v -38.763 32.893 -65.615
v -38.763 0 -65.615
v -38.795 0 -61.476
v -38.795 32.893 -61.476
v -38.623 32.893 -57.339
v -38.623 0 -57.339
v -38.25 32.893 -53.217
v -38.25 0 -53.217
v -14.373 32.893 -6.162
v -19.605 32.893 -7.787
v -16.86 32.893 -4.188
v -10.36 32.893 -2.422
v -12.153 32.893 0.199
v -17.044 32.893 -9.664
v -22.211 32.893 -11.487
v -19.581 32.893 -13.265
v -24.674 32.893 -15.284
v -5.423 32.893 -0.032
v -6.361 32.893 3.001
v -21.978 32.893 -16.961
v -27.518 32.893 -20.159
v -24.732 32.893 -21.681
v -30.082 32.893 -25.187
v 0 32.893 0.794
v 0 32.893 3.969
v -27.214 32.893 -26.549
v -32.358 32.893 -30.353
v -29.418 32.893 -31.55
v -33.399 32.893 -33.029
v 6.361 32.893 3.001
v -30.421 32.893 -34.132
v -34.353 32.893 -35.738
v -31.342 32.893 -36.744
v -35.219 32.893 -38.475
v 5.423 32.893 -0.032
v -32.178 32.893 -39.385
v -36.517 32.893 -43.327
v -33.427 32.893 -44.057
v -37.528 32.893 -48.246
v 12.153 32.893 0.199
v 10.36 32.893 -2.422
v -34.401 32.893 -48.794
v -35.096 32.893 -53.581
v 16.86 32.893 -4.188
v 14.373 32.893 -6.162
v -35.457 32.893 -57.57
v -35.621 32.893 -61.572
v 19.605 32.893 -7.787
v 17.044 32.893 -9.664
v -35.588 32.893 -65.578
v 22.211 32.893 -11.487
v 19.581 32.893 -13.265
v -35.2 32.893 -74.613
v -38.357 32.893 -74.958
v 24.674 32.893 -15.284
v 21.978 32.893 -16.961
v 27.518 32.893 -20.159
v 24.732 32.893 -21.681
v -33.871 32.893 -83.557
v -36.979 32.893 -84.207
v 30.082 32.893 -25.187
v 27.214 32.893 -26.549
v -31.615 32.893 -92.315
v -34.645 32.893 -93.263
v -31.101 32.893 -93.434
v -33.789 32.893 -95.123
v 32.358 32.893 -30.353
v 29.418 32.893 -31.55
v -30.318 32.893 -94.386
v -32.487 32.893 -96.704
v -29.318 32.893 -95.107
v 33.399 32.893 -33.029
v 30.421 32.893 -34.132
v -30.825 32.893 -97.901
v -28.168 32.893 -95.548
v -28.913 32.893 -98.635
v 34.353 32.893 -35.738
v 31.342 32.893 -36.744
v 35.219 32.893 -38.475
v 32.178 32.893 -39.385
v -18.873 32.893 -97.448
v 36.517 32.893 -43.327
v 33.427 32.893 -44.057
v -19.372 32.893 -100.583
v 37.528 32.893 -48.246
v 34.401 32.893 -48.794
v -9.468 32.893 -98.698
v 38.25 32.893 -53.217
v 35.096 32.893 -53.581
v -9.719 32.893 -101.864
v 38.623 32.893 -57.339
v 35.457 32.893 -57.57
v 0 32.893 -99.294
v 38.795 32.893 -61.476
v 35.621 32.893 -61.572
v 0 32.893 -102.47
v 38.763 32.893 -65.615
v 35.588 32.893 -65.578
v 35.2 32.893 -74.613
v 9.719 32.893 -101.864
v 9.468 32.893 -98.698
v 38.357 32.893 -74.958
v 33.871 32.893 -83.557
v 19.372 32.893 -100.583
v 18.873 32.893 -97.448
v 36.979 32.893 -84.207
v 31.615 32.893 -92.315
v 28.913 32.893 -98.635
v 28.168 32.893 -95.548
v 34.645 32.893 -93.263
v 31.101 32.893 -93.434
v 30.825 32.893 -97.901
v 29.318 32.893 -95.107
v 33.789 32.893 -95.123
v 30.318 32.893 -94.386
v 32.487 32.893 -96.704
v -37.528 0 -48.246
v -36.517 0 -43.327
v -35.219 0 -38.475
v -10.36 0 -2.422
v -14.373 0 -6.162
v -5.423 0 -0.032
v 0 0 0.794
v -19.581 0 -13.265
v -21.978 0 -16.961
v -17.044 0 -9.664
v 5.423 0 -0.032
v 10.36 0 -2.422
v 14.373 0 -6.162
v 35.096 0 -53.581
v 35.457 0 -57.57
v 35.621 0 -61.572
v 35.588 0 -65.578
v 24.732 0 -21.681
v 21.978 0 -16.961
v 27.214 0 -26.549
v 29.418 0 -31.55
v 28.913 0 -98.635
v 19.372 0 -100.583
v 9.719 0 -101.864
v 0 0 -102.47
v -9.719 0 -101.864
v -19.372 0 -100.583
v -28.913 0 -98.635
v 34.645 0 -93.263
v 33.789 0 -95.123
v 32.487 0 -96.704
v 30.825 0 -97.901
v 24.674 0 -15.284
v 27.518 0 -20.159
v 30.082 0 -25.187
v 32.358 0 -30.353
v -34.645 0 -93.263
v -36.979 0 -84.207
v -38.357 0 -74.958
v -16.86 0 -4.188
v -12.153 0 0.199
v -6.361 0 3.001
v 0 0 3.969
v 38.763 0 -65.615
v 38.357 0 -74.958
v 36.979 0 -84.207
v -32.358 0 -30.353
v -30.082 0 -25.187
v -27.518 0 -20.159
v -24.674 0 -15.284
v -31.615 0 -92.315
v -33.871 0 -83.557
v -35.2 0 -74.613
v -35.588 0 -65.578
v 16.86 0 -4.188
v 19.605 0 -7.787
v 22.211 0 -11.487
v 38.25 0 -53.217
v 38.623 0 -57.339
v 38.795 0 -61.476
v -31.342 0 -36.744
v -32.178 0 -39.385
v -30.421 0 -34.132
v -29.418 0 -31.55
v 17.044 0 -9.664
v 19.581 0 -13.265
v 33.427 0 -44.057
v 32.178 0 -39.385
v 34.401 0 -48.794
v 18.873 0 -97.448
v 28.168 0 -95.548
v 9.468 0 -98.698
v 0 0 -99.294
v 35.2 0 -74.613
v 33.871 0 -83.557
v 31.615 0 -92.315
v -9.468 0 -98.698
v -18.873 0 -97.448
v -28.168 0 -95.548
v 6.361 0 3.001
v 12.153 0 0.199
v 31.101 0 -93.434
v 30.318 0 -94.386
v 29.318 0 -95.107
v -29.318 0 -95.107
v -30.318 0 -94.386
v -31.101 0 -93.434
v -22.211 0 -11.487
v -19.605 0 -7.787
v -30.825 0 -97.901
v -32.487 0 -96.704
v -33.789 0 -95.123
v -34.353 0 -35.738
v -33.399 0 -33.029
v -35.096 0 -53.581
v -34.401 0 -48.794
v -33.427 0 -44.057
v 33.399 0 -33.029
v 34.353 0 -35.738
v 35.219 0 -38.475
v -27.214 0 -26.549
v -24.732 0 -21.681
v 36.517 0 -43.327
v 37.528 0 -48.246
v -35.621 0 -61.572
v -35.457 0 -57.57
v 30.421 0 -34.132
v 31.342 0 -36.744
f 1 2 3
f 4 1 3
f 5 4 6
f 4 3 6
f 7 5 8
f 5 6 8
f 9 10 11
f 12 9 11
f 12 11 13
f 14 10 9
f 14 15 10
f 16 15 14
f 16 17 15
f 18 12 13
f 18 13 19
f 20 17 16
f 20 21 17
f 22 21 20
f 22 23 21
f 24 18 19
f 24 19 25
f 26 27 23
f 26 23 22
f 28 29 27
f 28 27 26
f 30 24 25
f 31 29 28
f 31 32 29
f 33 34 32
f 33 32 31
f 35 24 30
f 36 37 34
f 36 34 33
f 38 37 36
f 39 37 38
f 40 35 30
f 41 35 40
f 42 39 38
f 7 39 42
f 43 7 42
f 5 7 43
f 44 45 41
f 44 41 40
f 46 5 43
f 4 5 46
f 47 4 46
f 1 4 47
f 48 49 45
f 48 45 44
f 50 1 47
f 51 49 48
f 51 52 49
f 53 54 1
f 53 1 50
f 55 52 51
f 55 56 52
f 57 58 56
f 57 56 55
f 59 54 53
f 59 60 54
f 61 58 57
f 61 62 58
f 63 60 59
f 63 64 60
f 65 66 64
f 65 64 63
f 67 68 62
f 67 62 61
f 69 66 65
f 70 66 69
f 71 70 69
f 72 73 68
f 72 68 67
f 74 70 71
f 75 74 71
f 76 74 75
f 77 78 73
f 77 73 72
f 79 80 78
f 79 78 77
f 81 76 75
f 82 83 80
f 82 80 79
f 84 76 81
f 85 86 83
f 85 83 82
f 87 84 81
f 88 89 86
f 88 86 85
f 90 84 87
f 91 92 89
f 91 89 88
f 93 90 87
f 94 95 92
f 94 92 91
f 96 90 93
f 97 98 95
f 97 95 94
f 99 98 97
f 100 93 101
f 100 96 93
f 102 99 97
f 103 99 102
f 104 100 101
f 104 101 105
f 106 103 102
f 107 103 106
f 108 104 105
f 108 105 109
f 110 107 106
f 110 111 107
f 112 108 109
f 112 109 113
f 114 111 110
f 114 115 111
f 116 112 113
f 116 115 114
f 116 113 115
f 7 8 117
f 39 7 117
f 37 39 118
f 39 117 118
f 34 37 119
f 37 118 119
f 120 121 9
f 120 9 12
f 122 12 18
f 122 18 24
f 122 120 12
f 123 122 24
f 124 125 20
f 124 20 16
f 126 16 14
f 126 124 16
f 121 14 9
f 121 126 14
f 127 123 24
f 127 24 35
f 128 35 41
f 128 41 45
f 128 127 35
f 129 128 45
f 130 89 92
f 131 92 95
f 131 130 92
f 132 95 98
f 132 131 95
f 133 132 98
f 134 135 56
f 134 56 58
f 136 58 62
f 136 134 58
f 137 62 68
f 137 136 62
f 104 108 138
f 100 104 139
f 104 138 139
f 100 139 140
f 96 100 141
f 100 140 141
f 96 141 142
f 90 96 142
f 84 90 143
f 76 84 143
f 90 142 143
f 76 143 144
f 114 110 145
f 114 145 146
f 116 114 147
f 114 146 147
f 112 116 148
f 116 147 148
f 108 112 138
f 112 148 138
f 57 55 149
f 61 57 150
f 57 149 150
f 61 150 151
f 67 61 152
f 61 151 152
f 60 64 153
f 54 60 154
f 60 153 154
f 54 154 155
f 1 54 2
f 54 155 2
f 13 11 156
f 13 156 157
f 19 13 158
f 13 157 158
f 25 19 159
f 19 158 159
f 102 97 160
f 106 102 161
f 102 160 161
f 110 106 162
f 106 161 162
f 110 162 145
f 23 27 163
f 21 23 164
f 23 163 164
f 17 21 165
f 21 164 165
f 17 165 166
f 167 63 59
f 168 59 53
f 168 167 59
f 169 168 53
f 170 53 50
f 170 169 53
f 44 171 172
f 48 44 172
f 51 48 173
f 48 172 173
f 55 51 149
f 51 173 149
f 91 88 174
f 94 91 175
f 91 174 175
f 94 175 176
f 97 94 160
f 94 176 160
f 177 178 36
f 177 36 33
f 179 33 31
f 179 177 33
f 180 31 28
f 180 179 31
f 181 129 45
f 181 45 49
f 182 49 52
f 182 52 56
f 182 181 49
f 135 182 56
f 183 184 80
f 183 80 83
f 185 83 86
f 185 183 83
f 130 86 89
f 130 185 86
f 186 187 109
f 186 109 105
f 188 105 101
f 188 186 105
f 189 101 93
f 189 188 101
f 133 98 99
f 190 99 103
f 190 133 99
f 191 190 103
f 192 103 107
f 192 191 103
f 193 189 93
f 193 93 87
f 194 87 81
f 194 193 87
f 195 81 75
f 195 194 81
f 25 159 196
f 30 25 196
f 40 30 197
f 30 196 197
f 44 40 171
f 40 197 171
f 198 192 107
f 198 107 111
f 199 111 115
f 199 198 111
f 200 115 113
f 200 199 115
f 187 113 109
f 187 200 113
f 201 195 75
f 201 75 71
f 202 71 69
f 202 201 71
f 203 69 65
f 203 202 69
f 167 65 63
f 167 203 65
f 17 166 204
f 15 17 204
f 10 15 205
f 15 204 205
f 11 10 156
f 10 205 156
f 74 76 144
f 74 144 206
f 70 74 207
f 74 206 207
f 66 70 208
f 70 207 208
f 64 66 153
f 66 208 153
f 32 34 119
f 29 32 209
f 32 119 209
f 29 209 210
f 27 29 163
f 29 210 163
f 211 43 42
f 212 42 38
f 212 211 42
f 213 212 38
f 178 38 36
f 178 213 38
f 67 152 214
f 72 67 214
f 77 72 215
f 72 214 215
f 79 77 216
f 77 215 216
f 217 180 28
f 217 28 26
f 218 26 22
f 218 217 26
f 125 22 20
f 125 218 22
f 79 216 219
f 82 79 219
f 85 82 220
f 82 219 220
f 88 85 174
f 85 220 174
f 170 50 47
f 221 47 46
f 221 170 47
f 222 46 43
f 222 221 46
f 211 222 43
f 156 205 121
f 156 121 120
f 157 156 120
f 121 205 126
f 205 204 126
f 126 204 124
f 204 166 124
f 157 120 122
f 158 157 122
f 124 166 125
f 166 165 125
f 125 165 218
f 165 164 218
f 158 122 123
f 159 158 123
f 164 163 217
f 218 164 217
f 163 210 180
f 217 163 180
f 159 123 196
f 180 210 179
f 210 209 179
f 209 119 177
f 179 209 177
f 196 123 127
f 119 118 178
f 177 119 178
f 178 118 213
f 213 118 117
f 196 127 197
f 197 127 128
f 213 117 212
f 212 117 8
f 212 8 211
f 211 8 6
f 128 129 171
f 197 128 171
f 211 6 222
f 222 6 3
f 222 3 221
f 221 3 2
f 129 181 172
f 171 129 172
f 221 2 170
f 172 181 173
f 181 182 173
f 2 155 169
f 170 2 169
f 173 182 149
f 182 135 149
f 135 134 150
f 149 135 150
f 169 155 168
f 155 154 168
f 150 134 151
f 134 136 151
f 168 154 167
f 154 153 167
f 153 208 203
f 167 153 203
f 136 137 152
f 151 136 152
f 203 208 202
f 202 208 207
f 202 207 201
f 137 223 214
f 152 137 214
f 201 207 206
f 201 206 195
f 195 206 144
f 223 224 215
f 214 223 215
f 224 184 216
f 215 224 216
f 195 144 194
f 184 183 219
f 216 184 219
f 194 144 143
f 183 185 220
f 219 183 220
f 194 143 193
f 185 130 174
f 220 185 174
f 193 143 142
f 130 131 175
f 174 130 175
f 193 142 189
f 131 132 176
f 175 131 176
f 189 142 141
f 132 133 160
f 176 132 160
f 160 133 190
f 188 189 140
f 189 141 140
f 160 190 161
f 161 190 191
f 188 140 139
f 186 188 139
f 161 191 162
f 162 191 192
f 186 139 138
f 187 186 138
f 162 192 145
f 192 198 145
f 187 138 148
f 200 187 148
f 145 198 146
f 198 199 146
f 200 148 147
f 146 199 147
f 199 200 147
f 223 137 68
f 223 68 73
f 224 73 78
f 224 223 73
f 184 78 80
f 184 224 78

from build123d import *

# Parameters (mm, degrees)
EXTRUDE_THIN1_DEPTH = 32.893


with BuildPart() as part:
    # Sketch1 → Extrude-Thin1 (new body)
    with BuildSketch(Plane(origin=(0, 0, 0), x_dir=(1, 0, 0), z_dir=(0, 1, 0))):
        with BuildLine():
            ThreePointArc((16.859690416, 4.188302755), (20.925357953, 9.624263697), (24.673792776, 15.283641778))
            ThreePointArc((24.673792776, 15.283641778), (28.835872744, 22.655056116), (32.358402849, 30.352616811))
            ThreePointArc((32.358402849, 30.352616811), (33.886605852, 34.379502928), (35.21947344, 38.475193372))
            ThreePointArc((35.21947344, 38.475193372), (37.058530457, 45.779269739), (38.249723875, 53.216521954))
            ThreePointArc((38.249723875, 53.216521954), (38.73447294, 59.406515206), (38.763430781, 65.615392687))
            ThreePointArc((38.763430781, 65.615392687), (37.788410014, 79.600485429), (34.645449796, 93.262669938))
            ThreePointArc((34.645449796, 93.262669938), (32.487336087, 96.704142568), (28.913228351, 98.634671649))
            ThreePointArc((28.913228351, 98.634671649), (14.556820296, 101.307748109), (0, 102.469975666))
            ThreePointArc((0, 102.469975666), (-14.556820296, 101.307748109), (-28.913228351, 98.634671649))
            ThreePointArc((-28.913228351, 98.634671649), (-32.487336087, 96.704142568), (-34.645449796, 93.262669938))
            ThreePointArc((-34.645449796, 93.262669938), (-37.788410014, 79.600485429), (-38.763430781, 65.615392687))
            ThreePointArc((-38.763430781, 65.615392687), (-38.73447294, 59.406515206), (-38.249723875, 53.216521954))
            ThreePointArc((-38.249723875, 53.216521954), (-37.058530457, 45.779269739), (-35.21947344, 38.475193372))
            ThreePointArc((-35.21947344, 38.475193372), (-33.886605846, 34.37950291), (-32.358402835, 30.352616775))
            ThreePointArc((-32.358402835, 30.352616775), (-28.835872735, 22.655056099), (-24.673792776, 15.283641778))
            ThreePointArc((-24.673792776, 15.283641778), (-20.925357849, 9.62426355), (-16.859690192, 4.188302473))
            ThreePointArc((-16.859690192, 4.188302473), (-9.362082274, -1.817051595), (0, -3.968752666))
            ThreePointArc((0, -3.968752666), (9.362082435, -1.817051517), (16.859690416, 4.188302755))
        make_face()
        with BuildLine():
            ThreePointArc((14.372541639, 6.161806229), (18.329513357, 11.452436511), (21.9777336, 16.960510859))
            ThreePointArc((21.9777336, 16.960510859), (26.007427238, 24.097457247), (29.417913618, 31.550176027))
            ThreePointArc((29.417913618, 31.550176027), (30.891950162, 35.434331017), (32.177574869, 39.384851595))
            ThreePointArc((32.177574869, 39.384851595), (33.948557442, 46.418560629), (35.095657703, 53.580515883))
            ThreePointArc((35.095657703, 53.580515883), (35.563525818, 59.570235573), (35.587965764, 65.578150788))
            ThreePointArc((35.587965764, 65.578150788), (34.652553918, 79.102488225), (31.615324304, 92.314525718))
            ThreePointArc((31.615324304, 92.314525718), (30.317885926, 94.385927862), (28.167840685, 95.548407388))
            ThreePointArc((28.167840685, 95.548407388), (14.1814691, 98.154719953), (0, 99.29375))
            ThreePointArc((0, 99.29375), (-14.1814691, 98.154719953), (-28.167840685, 95.548407388))
            ThreePointArc((-28.167840685, 95.548407388), (-30.317885926, 94.385927862), (-31.615324304, 92.314525718))
            ThreePointArc((-31.615324304, 92.314525718), (-34.652553918, 79.102488225), (-35.587965764, 65.578150788))
            ThreePointArc((-35.587965764, 65.578150788), (-35.563525818, 59.570235573), (-35.095657703, 53.580515883))
            ThreePointArc((-35.095657703, 53.580515883), (-33.948557442, 46.418560629), (-32.177574869, 39.384851595))
            ThreePointArc((-32.177574869, 39.384851595), (-30.891950162, 35.434331017), (-29.417913618, 31.550176027))
            ThreePointArc((-29.417913618, 31.550176027), (-26.007427238, 24.097457247), (-21.9777336, 16.960510859))
            ThreePointArc((-21.9777336, 16.960510859), (-18.329513357, 11.452436511), (-14.372541639, 6.161806229))
            ThreePointArc((-14.372541639, 6.161806229), (-7.981004402, 1.041838599), (0, -0.79375))
            ThreePointArc((0, -0.79375), (7.981004402, 1.041838599), (14.372541639, 6.161806229))
        make_face(mode=Mode.SUBTRACT)
    extrude(amount=EXTRUDE_THIN1_DEPTH)


solid = part.part
